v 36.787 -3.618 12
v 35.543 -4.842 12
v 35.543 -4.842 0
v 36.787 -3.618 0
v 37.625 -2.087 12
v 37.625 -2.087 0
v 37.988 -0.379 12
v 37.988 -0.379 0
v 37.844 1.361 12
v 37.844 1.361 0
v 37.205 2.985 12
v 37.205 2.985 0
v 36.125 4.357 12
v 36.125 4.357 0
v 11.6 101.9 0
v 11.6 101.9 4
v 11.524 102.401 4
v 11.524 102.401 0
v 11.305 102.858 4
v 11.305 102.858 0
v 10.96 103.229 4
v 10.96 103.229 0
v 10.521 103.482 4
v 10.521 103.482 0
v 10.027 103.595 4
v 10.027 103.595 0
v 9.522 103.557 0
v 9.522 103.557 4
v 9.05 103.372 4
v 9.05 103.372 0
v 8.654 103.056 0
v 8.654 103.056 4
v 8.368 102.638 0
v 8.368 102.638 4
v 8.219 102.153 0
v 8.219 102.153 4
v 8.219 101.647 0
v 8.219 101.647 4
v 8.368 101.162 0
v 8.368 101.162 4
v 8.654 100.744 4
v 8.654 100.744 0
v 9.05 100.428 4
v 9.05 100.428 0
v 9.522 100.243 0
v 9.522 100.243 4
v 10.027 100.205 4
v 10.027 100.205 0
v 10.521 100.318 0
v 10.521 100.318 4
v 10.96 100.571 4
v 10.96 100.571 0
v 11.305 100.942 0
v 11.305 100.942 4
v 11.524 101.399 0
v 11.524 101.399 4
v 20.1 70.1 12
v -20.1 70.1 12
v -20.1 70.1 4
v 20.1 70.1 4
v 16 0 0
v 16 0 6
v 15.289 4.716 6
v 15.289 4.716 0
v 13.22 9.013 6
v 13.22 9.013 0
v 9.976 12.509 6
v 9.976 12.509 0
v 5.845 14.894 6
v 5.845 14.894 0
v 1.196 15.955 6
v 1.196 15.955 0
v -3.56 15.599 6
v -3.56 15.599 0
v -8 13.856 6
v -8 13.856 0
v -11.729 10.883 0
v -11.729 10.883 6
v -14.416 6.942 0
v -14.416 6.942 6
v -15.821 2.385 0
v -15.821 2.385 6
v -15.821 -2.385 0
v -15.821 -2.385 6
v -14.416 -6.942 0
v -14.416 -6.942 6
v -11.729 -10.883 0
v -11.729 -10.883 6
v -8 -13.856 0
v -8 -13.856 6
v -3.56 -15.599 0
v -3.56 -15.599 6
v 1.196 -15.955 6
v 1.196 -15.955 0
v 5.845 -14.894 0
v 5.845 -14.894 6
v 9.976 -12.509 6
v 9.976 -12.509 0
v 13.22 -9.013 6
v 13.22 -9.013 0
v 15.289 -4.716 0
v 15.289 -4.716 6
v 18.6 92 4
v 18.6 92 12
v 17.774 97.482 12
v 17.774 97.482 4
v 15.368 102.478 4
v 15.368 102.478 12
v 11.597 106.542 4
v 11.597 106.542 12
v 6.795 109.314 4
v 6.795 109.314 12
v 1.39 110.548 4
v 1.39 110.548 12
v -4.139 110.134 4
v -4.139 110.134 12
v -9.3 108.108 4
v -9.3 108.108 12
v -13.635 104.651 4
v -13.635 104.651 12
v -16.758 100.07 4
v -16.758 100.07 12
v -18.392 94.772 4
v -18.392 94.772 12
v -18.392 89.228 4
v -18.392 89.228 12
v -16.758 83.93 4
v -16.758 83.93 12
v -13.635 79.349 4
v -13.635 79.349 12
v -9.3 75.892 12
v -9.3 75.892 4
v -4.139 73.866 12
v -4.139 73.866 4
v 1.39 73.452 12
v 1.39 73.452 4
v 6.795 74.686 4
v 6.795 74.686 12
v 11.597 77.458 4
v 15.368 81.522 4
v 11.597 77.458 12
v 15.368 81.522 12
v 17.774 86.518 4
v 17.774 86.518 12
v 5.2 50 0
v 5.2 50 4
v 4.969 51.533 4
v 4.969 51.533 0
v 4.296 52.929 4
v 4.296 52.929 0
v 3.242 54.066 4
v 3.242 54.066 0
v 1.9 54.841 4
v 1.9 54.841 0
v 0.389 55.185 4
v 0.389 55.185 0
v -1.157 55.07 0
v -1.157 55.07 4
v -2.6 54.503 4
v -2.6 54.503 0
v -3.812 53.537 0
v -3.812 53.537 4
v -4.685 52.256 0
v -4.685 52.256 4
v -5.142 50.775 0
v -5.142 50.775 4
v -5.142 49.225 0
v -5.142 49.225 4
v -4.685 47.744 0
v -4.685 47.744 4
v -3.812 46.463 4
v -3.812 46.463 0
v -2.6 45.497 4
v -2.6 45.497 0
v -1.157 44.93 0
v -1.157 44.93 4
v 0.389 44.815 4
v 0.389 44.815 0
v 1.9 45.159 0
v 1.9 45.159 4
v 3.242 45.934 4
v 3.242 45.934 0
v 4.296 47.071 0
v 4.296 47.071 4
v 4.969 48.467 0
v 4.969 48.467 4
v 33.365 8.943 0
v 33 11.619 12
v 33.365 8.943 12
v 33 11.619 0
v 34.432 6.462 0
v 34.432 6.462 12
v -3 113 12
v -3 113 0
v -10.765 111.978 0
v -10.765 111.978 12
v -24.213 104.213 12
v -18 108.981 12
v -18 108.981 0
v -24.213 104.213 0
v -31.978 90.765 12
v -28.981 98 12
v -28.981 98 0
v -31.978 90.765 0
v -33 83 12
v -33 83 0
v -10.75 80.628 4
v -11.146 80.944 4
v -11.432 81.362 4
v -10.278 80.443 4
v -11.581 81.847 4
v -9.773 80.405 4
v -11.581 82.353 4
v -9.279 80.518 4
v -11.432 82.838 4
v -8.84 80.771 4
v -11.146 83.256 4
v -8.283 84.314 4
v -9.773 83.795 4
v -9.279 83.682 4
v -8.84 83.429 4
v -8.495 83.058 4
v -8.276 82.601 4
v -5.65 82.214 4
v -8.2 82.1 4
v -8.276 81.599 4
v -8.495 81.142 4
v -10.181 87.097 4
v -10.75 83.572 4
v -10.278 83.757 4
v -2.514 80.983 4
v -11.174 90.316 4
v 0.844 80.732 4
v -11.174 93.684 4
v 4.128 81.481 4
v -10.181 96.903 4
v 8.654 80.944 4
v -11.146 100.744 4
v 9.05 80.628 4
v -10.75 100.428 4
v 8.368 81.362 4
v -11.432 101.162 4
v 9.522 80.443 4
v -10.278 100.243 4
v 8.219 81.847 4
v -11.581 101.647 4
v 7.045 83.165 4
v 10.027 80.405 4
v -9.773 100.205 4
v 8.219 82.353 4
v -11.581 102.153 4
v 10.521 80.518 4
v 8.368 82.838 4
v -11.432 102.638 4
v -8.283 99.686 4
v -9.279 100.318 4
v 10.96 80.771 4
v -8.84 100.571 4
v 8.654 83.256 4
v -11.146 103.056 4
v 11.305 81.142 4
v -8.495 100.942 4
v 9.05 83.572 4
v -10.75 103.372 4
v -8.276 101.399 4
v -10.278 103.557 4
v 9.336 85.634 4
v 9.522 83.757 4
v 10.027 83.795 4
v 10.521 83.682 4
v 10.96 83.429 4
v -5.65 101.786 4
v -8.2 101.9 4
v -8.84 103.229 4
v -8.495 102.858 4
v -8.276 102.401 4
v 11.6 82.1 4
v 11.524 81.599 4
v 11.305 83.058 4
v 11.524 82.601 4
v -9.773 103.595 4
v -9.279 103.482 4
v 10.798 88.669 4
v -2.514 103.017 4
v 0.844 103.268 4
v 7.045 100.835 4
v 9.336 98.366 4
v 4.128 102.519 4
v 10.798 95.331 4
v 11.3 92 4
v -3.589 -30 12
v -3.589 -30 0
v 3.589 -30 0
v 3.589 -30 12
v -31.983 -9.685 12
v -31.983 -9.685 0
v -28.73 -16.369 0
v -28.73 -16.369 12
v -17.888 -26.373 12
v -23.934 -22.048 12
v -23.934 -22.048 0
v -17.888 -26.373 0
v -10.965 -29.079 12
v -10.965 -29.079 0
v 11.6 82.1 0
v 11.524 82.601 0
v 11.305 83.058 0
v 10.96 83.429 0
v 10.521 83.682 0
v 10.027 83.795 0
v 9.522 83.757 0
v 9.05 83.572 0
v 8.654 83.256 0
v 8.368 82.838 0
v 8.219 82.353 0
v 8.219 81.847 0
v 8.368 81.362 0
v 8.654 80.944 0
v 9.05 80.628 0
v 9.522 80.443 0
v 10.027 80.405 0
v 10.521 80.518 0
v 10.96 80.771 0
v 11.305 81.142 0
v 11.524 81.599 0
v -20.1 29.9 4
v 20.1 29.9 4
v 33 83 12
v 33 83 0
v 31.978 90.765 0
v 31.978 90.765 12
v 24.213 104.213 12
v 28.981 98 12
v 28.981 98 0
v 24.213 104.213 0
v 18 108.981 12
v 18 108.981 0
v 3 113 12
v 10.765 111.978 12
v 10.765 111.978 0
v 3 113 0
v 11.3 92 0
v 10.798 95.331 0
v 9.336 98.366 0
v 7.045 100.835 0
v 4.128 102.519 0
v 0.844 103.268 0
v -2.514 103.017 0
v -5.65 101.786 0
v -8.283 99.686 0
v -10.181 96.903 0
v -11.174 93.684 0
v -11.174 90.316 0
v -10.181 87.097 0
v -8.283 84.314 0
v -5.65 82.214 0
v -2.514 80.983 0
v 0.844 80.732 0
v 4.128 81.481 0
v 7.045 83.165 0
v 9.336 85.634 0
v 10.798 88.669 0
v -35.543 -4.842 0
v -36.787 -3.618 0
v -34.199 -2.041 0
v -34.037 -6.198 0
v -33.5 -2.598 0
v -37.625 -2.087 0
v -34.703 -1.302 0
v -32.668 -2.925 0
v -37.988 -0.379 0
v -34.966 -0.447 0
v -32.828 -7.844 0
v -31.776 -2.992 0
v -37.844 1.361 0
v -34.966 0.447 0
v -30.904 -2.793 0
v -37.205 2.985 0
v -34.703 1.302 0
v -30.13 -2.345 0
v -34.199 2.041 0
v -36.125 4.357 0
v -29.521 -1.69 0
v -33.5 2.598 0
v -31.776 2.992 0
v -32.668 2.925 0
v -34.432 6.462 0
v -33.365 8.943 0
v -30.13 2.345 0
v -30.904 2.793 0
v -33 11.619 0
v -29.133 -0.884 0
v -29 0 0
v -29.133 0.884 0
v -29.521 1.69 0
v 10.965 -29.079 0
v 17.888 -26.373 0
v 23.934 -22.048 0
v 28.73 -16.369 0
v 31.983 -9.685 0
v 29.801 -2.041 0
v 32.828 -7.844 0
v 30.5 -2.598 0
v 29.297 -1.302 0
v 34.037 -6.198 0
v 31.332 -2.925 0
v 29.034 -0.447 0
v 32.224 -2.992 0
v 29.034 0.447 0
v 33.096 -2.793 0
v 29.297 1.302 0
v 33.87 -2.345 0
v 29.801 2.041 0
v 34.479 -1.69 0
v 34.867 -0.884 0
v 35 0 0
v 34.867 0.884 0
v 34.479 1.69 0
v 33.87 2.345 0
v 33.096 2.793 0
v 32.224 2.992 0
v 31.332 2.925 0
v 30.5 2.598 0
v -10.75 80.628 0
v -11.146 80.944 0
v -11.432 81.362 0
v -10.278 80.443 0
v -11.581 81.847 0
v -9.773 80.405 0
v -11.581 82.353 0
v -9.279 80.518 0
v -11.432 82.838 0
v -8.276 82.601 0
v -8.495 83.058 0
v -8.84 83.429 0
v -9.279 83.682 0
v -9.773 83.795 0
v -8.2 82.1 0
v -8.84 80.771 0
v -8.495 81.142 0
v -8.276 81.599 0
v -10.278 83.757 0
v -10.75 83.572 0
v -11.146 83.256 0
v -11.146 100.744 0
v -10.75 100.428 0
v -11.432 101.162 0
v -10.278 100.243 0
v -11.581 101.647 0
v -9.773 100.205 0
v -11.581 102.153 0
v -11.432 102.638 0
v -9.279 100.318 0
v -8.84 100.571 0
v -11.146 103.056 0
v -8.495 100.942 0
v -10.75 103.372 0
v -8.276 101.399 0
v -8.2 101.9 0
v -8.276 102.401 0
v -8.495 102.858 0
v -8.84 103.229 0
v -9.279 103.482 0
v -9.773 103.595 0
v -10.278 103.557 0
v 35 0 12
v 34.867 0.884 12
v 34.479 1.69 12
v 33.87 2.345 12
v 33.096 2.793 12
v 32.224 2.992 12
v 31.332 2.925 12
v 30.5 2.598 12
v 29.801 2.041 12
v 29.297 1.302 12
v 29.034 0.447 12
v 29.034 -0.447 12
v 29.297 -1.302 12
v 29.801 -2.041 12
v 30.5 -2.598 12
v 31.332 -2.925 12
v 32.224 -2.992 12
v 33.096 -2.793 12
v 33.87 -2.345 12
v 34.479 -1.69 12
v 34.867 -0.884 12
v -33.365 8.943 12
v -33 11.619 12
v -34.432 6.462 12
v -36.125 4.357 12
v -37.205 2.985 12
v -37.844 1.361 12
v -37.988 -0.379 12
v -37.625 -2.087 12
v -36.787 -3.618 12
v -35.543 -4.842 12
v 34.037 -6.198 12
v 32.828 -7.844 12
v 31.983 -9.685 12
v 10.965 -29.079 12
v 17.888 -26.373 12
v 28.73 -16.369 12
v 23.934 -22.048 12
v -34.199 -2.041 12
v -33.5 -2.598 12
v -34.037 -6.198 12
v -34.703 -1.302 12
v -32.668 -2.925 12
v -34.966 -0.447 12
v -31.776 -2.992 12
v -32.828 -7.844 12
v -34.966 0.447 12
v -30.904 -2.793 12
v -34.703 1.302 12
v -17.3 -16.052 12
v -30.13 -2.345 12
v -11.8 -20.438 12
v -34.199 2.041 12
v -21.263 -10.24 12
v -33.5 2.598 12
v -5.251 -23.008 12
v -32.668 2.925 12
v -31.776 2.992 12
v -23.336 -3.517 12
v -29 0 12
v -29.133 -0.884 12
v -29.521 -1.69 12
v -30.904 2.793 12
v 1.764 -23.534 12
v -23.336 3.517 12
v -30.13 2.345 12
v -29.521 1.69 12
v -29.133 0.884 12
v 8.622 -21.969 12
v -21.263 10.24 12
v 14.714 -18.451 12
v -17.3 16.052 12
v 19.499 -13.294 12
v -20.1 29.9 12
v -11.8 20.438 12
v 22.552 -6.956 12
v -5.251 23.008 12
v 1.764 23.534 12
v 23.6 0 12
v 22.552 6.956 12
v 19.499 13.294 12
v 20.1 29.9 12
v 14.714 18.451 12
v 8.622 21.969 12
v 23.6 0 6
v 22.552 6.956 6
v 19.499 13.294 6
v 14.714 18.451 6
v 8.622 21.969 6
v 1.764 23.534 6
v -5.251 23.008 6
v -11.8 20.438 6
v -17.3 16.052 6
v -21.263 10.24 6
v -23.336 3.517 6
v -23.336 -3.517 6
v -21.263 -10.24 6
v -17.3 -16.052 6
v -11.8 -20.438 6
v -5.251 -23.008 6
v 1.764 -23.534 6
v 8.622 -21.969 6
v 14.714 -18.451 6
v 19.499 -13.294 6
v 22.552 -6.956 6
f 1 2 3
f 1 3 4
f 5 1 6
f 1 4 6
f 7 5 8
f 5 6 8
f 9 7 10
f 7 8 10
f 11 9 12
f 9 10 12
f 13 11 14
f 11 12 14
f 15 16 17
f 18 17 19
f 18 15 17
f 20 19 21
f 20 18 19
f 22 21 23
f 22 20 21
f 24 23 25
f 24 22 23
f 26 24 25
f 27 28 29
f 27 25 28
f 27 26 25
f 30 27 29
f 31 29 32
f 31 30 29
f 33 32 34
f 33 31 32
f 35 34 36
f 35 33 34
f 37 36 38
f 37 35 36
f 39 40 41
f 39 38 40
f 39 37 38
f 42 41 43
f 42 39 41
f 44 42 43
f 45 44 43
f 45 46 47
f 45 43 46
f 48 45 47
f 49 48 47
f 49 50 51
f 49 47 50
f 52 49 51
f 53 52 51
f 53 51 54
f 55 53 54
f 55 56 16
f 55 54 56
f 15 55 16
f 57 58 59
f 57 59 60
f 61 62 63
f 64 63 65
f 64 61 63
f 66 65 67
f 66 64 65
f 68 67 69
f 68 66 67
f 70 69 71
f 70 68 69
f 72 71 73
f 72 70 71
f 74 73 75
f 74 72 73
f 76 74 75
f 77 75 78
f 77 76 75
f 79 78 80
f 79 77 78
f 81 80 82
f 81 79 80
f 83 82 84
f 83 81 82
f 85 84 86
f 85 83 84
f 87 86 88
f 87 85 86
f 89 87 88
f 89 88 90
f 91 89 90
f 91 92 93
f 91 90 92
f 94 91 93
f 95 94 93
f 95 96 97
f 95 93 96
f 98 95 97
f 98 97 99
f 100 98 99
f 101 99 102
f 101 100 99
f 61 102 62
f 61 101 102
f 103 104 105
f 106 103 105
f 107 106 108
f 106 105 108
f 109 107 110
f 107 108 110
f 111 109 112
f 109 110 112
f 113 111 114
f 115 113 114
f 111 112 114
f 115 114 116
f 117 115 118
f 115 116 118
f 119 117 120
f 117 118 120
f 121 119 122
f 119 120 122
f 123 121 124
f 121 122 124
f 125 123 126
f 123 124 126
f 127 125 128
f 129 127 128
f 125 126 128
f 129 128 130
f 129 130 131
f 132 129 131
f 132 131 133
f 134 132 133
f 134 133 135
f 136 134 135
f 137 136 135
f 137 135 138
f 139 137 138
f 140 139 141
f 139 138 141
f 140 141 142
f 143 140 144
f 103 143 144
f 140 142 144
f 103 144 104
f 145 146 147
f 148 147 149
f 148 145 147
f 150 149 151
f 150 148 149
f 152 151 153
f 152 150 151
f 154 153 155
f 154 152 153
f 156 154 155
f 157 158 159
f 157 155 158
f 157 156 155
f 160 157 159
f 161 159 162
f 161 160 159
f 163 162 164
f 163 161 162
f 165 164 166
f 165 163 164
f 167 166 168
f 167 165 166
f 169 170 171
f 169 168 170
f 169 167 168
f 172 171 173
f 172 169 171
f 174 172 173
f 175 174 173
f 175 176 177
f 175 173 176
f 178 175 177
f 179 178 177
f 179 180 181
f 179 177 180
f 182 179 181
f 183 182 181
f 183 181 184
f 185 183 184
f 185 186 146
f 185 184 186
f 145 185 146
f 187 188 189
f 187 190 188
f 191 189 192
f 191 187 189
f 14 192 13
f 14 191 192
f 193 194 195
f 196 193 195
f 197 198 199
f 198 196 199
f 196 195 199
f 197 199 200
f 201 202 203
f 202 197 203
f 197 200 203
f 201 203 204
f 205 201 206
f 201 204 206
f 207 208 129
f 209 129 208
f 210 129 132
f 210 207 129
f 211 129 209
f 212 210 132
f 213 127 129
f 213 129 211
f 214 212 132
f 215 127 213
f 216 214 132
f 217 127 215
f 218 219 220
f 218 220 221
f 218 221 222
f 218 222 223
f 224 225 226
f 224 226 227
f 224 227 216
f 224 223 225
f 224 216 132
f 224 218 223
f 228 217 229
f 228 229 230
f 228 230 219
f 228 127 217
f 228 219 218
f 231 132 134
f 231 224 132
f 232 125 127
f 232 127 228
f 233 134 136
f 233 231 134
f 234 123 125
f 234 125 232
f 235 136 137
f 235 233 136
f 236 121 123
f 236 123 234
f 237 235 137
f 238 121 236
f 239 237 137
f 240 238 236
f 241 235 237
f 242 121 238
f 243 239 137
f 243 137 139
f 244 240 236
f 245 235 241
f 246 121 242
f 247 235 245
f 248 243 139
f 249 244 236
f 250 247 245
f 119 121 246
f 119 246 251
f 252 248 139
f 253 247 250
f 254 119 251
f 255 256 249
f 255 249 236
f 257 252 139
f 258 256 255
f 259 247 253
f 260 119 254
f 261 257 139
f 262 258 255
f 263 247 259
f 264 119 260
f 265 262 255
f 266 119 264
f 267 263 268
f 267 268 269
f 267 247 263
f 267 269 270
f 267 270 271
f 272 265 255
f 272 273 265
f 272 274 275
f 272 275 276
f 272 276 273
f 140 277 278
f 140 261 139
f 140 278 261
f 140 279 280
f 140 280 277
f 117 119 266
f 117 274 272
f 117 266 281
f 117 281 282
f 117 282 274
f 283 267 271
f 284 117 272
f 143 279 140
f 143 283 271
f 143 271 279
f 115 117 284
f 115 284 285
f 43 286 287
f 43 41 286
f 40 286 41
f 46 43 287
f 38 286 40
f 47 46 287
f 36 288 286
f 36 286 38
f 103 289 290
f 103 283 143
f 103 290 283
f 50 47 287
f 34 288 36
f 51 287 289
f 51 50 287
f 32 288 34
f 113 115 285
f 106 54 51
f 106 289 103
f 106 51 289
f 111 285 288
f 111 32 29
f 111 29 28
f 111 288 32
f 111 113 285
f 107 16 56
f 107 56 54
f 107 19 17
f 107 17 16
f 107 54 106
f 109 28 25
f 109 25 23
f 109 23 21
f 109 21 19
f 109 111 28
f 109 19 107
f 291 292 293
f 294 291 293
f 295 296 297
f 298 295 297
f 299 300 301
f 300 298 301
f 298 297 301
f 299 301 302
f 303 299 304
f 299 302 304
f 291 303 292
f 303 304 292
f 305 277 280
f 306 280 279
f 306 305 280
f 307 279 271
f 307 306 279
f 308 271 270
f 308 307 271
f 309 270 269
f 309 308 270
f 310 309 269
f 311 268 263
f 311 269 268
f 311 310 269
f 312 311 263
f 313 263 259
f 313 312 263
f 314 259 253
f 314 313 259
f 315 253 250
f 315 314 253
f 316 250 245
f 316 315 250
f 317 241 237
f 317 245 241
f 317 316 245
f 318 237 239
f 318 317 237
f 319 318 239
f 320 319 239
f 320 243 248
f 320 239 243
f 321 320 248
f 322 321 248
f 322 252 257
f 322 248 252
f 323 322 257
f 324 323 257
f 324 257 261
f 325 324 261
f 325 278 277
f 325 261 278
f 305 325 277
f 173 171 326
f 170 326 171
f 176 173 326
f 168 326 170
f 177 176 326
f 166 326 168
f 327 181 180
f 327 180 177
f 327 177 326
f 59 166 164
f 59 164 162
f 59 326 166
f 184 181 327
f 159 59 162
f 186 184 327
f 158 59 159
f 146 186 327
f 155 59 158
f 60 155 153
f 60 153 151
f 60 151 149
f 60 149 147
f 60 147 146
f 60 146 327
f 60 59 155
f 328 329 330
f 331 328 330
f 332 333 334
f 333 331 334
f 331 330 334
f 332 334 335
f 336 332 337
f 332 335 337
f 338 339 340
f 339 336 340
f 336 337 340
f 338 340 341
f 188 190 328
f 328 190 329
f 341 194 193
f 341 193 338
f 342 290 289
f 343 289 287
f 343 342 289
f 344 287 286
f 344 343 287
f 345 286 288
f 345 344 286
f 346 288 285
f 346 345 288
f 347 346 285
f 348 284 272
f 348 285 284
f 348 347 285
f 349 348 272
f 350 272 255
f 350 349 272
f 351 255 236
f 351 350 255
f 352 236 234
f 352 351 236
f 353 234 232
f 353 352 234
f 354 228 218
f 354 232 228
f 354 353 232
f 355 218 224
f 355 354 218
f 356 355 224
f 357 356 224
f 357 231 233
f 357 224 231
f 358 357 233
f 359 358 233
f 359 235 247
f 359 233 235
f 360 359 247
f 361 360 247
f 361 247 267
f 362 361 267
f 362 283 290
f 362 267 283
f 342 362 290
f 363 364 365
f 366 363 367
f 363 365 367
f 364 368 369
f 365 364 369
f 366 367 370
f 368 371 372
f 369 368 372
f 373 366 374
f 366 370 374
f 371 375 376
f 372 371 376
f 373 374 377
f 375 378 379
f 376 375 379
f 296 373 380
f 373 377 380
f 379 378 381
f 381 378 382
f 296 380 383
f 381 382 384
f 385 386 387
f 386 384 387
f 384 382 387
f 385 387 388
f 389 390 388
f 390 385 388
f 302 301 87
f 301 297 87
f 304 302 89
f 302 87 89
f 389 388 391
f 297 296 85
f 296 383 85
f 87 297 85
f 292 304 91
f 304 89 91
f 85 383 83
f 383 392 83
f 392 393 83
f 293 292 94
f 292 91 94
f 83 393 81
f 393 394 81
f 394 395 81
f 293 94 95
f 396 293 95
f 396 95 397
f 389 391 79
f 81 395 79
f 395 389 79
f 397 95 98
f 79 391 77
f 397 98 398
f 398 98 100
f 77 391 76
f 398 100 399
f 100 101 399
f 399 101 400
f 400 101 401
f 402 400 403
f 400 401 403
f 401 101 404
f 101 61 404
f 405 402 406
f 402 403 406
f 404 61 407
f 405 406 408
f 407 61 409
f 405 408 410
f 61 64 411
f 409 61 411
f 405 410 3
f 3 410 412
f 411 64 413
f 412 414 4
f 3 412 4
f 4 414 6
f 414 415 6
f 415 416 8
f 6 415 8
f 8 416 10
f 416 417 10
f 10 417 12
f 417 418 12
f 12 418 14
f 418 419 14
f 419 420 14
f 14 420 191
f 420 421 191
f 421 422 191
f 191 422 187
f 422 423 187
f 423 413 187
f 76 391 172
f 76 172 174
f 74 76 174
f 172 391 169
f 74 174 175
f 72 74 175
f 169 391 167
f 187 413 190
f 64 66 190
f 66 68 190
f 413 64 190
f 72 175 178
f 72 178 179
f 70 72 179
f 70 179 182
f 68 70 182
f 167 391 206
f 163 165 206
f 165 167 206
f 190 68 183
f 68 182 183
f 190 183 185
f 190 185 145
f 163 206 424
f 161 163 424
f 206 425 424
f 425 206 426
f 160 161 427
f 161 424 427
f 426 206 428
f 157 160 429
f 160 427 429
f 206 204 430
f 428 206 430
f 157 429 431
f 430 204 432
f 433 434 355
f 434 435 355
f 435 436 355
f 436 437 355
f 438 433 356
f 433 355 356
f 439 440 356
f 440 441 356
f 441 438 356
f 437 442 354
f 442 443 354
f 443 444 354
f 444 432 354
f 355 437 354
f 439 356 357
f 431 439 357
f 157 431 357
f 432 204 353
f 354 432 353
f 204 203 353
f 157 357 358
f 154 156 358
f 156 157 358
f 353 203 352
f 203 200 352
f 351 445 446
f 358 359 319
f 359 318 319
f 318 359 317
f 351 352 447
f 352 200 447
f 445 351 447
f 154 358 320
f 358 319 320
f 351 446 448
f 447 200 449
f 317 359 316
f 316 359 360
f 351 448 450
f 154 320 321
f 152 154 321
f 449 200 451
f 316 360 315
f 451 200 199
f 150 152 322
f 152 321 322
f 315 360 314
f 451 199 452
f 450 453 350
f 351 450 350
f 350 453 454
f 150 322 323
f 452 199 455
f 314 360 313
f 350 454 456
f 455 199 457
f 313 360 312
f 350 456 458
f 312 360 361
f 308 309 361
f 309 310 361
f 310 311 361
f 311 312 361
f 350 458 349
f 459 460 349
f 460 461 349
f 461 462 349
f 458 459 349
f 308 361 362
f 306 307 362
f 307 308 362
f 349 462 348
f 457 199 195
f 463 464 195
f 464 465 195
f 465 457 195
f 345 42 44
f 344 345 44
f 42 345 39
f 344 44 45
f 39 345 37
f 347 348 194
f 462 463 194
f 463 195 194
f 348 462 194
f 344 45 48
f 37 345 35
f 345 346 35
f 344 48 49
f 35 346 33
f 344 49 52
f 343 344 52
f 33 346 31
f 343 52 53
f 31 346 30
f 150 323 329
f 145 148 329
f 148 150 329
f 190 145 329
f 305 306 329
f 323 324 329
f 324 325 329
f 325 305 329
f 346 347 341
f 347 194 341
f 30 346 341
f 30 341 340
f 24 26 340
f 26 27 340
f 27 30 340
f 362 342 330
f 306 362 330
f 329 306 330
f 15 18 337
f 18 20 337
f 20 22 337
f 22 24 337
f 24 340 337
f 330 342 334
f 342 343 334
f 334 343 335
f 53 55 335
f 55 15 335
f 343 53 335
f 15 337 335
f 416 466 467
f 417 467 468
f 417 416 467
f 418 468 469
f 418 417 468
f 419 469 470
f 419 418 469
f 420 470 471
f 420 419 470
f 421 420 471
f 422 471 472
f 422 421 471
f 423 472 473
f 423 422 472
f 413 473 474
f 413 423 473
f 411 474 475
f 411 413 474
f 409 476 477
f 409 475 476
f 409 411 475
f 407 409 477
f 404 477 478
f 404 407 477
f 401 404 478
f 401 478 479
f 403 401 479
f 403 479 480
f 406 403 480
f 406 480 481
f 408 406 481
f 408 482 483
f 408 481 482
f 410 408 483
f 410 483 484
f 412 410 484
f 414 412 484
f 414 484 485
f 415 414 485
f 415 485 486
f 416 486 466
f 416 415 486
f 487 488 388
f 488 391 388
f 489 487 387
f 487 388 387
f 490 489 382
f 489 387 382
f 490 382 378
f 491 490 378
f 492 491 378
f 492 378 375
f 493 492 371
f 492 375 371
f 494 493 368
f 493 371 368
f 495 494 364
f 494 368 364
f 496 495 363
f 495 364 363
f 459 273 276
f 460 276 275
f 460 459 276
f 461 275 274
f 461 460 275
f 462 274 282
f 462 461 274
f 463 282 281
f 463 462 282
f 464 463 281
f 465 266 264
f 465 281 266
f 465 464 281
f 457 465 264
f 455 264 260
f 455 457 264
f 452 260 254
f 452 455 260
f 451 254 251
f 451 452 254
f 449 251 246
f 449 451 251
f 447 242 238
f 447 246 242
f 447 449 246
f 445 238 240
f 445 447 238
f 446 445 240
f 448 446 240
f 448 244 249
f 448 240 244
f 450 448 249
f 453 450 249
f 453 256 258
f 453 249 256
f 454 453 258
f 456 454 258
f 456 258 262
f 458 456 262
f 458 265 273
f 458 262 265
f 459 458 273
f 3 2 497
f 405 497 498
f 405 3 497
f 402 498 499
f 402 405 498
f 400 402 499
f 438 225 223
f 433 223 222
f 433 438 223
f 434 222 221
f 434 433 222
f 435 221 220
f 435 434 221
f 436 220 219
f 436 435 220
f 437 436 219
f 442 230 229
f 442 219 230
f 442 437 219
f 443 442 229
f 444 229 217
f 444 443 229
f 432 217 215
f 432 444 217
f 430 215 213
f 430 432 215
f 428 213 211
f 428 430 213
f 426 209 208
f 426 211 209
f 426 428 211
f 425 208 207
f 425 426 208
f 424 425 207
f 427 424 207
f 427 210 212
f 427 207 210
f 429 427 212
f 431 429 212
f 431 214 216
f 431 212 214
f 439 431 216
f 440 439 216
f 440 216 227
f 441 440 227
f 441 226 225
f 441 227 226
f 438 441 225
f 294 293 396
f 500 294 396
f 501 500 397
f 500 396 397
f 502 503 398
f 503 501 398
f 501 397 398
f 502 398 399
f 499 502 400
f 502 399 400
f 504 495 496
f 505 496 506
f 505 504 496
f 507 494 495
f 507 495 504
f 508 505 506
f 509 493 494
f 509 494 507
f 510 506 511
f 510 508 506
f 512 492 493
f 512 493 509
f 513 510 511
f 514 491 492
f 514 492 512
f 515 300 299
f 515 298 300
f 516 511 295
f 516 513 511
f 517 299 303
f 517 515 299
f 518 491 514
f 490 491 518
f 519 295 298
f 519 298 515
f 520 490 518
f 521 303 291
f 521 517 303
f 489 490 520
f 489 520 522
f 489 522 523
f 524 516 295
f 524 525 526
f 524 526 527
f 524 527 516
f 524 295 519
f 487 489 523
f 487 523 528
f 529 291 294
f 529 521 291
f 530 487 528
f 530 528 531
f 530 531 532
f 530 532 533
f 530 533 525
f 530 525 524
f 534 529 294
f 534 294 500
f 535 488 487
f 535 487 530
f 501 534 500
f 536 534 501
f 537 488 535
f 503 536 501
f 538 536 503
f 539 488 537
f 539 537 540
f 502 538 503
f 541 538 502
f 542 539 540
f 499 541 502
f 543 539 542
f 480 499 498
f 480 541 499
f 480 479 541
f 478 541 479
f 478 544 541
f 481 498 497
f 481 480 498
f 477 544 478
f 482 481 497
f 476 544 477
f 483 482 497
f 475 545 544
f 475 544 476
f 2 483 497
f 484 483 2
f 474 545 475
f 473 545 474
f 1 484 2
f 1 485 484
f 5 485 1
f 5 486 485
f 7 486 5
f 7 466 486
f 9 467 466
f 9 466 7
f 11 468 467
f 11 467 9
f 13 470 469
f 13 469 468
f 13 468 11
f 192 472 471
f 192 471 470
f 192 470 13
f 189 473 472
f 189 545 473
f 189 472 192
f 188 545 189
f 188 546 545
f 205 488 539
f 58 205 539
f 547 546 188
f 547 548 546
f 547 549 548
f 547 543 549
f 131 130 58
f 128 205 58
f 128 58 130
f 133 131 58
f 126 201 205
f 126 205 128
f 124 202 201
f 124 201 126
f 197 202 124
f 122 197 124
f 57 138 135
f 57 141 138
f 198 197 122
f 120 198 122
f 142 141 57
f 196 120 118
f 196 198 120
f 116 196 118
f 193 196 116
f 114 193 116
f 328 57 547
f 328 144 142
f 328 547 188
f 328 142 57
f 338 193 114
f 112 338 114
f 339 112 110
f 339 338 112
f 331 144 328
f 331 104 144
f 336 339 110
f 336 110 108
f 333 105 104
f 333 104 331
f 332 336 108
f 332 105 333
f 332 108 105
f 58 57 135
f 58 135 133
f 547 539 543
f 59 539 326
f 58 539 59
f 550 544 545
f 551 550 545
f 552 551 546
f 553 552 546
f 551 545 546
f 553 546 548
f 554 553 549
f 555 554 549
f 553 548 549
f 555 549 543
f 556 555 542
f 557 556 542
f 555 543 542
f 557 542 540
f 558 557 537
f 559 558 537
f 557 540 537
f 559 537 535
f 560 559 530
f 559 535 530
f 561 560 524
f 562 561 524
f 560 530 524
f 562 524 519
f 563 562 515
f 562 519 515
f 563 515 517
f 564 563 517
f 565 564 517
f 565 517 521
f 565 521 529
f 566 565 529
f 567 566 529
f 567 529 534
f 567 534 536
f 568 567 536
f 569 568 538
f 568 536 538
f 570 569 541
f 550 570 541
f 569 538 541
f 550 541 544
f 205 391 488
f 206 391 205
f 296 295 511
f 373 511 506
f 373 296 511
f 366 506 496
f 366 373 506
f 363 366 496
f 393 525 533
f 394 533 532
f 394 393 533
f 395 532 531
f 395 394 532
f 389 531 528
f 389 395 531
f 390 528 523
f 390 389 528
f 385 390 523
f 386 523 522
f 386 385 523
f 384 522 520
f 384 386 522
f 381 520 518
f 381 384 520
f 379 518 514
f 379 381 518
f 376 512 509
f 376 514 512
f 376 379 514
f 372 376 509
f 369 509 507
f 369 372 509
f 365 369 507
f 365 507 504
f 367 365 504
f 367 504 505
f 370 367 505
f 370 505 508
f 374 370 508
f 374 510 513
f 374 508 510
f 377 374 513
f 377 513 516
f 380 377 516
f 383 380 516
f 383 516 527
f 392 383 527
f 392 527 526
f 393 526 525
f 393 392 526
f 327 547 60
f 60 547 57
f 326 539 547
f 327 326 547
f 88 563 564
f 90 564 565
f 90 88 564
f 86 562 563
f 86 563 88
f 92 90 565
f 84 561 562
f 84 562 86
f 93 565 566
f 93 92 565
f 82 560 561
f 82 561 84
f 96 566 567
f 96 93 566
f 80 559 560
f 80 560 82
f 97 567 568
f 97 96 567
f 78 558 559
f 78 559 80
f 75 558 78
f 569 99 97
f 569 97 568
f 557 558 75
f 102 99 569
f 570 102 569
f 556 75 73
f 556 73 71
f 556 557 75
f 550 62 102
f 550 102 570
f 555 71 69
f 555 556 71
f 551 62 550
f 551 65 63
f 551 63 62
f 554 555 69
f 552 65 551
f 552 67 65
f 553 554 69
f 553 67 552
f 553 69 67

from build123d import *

# Parameters (mm, degrees)
SKETCH1_W           = 66
SKETCH1_H           = 143
SKETCH1_R           = 16
SKETCH1_R_2         = 5.2
SKETCH1_R_3         = 11.3
SKETCH1_R_4         = 1.7
BOSS_EXTRUDE1_DEPTH = 12
SKETCH3_R           = 18.6
SKETCH3_W           = 40.2
SKETCH3_H           = 40.2
CUT_EXTRUDE1_DEPTH  = 8
SKETCH4_R           = 23.6
CUT_EXTRUDE2_DEPTH  = 6
SKETCH5_R           = 6
BOSS_EXTRUDE2_DEPTH = 12
SKETCH5_3_R         = 3
CUT_EXTRUDE3_DEPTH  = 120.82069938
FILLET1_R           = 30
VERRUNDUNG1_R       = 10


with BuildPart() as part:
    # Sketch1 → Boss-Extrude1 (new body)
    with BuildSketch(Plane.XY):
        with Locations((0, 41.5)):
            Rectangle(SKETCH1_W, SKETCH1_H)
        Circle(SKETCH1_R, mode=Mode.SUBTRACT)
        with Locations((0, 50)):
            Circle(SKETCH1_R_2, mode=Mode.SUBTRACT)
        with Locations((0, 92)):
            Circle(SKETCH1_R_3, mode=Mode.SUBTRACT)
        with Locations((-9.9, 101.9)):
            Circle(SKETCH1_R_4, mode=Mode.SUBTRACT)
        with Locations((9.9, 101.9)):
            Circle(SKETCH1_R_4, mode=Mode.SUBTRACT)
        with Locations((9.9, 82.1)):
            Circle(SKETCH1_R_4, mode=Mode.SUBTRACT)
        with Locations((-9.9, 82.1)):
            Circle(SKETCH1_R_4, mode=Mode.SUBTRACT)
    extrude(amount=BOSS_EXTRUDE1_DEPTH)

    # Sketch3 → Cut-Extrude1 (cut)
    with BuildSketch(Plane.XY.offset(12)):
        with Locations((0, 92)):
            Circle(SKETCH3_R)
        with Locations((0, 50)):
            Rectangle(SKETCH3_W, SKETCH3_H)
    extrude(amount=-CUT_EXTRUDE1_DEPTH, mode=Mode.SUBTRACT)

    # Sketch4 → Cut-Extrude2 (cut)
    with BuildSketch(Plane.XY.offset(12)):
        Circle(SKETCH4_R)
    extrude(amount=-CUT_EXTRUDE2_DEPTH, mode=Mode.SUBTRACT)

    # Sketch5 → Boss-Extrude2 (add)
    with BuildSketch(Plane.XY):
        with Locations((-32, 0)):
            Circle(SKETCH5_R)
        with Locations((32, 0)):
            Circle(SKETCH5_R)
    extrude(amount=BOSS_EXTRUDE2_DEPTH)

    # Sketch5<3> → Cut-Extrude3 (cut, through all)
    with BuildSketch(Plane.XY):
        with Locations((32, 0)):
            Circle(SKETCH5_3_R)
        with Locations((-32, 0)):
            Circle(SKETCH5_3_R)
    extrude(amount=CUT_EXTRUDE3_DEPTH, mode=Mode.SUBTRACT)

    # Fillet1
    # the kernel refuses this fillet: 30 mm, written as the material it takes off along each edge
    with BuildSketch(Plane(origin=(-33, 113, -75), x_dir=(1, 0, 0), z_dir=(0, 0, 1))) as fillet1_piece_1:
        with BuildLine():
            CenterArc((FILLET1_R, -FILLET1_R), FILLET1_R, 90, 90)
            Line((0, -FILLET1_R), (-FILLET1_R * 0.02, -FILLET1_R))
            Line((-FILLET1_R * 0.02, -FILLET1_R), (-FILLET1_R * 0.02, FILLET1_R * 0.02))
            Line((-FILLET1_R * 0.02, FILLET1_R * 0.02), (FILLET1_R, FILLET1_R * 0.02))
            Line((FILLET1_R, FILLET1_R * 0.02), (FILLET1_R, 0))
        make_face()
    extrude(amount=162, mode=Mode.SUBTRACT)
    with BuildSketch(Plane(origin=(33, 113, -75), x_dir=(-1, 0, 0), z_dir=(0, 0, 1))) as fillet1_piece_2:
        with BuildLine():
            CenterArc((FILLET1_R, FILLET1_R), FILLET1_R, 180, 90)
            Line((0, FILLET1_R), (-FILLET1_R * 0.02, FILLET1_R))
            Line((-FILLET1_R * 0.02, FILLET1_R), (-FILLET1_R * 0.02, -FILLET1_R * 0.02))
            Line((-FILLET1_R * 0.02, -FILLET1_R * 0.02), (FILLET1_R, -FILLET1_R * 0.02))
            Line((FILLET1_R, -FILLET1_R * 0.02), (FILLET1_R, 0))
        make_face()
    extrude(amount=162, mode=Mode.SUBTRACT)
    with BuildSketch(Plane(origin=(33, -30, -73.527205849), x_dir=(-1, 0, 0), z_dir=(0, 0, 1))) as fillet1_piece_3:
        with BuildLine():
            CenterArc((29.41088234, -30), FILLET1_R, 90, 78.626574363)
            Line((0, -24.083920217), (-0.588217647, -23.965598621))
            ThreePointArc((-0.588217647, -23.965598621), (-0.6, -12.041960108), (-0.6, 0))
            Line((-0.6, 0), (0, 0.6))
            Line((0, 0.6), (29.41088234, 0.6))
            Line((29.41088234, 0.6), (29.41088234, 0))
        make_face()
    extrude(amount=159.054411699, mode=Mode.SUBTRACT)
    with BuildSketch(Plane(origin=(-33, -30, -73.527205849), x_dir=(0, 1, 0), z_dir=(0, 0, 1))) as fillet1_piece_4:
        with BuildLine():
            CenterArc((30, -29.41088234), FILLET1_R, 101.373425637, 78.626574363)
            Line((0, -29.41088234), (-0.6, -29.41088234))
            Line((-0.6, -29.41088234), (-0.6, 0))
            Line((-0.6, 0), (0, 0.6))
            ThreePointArc((0, 0.6), (12.041960108, 0.6), (23.965598621, 0.588217647))
            Line((23.965598621, 0.588217647), (24.083920217, 0))
        make_face()
    extrude(amount=159.054411699, mode=Mode.SUBTRACT)

    # Verrundung1
    verrundung1_edges = [part.edges().sort_by_distance(p)[0] for p in [
        (-33, 5.916079783, 6),
        (-33, -5.916079783, 6),
        (33, -5.916079783, 6),
        (33, 5.916079783, 6),
    ]]
    fillet(verrundung1_edges, radius=VERRUNDUNG1_R)


solid = part.part
